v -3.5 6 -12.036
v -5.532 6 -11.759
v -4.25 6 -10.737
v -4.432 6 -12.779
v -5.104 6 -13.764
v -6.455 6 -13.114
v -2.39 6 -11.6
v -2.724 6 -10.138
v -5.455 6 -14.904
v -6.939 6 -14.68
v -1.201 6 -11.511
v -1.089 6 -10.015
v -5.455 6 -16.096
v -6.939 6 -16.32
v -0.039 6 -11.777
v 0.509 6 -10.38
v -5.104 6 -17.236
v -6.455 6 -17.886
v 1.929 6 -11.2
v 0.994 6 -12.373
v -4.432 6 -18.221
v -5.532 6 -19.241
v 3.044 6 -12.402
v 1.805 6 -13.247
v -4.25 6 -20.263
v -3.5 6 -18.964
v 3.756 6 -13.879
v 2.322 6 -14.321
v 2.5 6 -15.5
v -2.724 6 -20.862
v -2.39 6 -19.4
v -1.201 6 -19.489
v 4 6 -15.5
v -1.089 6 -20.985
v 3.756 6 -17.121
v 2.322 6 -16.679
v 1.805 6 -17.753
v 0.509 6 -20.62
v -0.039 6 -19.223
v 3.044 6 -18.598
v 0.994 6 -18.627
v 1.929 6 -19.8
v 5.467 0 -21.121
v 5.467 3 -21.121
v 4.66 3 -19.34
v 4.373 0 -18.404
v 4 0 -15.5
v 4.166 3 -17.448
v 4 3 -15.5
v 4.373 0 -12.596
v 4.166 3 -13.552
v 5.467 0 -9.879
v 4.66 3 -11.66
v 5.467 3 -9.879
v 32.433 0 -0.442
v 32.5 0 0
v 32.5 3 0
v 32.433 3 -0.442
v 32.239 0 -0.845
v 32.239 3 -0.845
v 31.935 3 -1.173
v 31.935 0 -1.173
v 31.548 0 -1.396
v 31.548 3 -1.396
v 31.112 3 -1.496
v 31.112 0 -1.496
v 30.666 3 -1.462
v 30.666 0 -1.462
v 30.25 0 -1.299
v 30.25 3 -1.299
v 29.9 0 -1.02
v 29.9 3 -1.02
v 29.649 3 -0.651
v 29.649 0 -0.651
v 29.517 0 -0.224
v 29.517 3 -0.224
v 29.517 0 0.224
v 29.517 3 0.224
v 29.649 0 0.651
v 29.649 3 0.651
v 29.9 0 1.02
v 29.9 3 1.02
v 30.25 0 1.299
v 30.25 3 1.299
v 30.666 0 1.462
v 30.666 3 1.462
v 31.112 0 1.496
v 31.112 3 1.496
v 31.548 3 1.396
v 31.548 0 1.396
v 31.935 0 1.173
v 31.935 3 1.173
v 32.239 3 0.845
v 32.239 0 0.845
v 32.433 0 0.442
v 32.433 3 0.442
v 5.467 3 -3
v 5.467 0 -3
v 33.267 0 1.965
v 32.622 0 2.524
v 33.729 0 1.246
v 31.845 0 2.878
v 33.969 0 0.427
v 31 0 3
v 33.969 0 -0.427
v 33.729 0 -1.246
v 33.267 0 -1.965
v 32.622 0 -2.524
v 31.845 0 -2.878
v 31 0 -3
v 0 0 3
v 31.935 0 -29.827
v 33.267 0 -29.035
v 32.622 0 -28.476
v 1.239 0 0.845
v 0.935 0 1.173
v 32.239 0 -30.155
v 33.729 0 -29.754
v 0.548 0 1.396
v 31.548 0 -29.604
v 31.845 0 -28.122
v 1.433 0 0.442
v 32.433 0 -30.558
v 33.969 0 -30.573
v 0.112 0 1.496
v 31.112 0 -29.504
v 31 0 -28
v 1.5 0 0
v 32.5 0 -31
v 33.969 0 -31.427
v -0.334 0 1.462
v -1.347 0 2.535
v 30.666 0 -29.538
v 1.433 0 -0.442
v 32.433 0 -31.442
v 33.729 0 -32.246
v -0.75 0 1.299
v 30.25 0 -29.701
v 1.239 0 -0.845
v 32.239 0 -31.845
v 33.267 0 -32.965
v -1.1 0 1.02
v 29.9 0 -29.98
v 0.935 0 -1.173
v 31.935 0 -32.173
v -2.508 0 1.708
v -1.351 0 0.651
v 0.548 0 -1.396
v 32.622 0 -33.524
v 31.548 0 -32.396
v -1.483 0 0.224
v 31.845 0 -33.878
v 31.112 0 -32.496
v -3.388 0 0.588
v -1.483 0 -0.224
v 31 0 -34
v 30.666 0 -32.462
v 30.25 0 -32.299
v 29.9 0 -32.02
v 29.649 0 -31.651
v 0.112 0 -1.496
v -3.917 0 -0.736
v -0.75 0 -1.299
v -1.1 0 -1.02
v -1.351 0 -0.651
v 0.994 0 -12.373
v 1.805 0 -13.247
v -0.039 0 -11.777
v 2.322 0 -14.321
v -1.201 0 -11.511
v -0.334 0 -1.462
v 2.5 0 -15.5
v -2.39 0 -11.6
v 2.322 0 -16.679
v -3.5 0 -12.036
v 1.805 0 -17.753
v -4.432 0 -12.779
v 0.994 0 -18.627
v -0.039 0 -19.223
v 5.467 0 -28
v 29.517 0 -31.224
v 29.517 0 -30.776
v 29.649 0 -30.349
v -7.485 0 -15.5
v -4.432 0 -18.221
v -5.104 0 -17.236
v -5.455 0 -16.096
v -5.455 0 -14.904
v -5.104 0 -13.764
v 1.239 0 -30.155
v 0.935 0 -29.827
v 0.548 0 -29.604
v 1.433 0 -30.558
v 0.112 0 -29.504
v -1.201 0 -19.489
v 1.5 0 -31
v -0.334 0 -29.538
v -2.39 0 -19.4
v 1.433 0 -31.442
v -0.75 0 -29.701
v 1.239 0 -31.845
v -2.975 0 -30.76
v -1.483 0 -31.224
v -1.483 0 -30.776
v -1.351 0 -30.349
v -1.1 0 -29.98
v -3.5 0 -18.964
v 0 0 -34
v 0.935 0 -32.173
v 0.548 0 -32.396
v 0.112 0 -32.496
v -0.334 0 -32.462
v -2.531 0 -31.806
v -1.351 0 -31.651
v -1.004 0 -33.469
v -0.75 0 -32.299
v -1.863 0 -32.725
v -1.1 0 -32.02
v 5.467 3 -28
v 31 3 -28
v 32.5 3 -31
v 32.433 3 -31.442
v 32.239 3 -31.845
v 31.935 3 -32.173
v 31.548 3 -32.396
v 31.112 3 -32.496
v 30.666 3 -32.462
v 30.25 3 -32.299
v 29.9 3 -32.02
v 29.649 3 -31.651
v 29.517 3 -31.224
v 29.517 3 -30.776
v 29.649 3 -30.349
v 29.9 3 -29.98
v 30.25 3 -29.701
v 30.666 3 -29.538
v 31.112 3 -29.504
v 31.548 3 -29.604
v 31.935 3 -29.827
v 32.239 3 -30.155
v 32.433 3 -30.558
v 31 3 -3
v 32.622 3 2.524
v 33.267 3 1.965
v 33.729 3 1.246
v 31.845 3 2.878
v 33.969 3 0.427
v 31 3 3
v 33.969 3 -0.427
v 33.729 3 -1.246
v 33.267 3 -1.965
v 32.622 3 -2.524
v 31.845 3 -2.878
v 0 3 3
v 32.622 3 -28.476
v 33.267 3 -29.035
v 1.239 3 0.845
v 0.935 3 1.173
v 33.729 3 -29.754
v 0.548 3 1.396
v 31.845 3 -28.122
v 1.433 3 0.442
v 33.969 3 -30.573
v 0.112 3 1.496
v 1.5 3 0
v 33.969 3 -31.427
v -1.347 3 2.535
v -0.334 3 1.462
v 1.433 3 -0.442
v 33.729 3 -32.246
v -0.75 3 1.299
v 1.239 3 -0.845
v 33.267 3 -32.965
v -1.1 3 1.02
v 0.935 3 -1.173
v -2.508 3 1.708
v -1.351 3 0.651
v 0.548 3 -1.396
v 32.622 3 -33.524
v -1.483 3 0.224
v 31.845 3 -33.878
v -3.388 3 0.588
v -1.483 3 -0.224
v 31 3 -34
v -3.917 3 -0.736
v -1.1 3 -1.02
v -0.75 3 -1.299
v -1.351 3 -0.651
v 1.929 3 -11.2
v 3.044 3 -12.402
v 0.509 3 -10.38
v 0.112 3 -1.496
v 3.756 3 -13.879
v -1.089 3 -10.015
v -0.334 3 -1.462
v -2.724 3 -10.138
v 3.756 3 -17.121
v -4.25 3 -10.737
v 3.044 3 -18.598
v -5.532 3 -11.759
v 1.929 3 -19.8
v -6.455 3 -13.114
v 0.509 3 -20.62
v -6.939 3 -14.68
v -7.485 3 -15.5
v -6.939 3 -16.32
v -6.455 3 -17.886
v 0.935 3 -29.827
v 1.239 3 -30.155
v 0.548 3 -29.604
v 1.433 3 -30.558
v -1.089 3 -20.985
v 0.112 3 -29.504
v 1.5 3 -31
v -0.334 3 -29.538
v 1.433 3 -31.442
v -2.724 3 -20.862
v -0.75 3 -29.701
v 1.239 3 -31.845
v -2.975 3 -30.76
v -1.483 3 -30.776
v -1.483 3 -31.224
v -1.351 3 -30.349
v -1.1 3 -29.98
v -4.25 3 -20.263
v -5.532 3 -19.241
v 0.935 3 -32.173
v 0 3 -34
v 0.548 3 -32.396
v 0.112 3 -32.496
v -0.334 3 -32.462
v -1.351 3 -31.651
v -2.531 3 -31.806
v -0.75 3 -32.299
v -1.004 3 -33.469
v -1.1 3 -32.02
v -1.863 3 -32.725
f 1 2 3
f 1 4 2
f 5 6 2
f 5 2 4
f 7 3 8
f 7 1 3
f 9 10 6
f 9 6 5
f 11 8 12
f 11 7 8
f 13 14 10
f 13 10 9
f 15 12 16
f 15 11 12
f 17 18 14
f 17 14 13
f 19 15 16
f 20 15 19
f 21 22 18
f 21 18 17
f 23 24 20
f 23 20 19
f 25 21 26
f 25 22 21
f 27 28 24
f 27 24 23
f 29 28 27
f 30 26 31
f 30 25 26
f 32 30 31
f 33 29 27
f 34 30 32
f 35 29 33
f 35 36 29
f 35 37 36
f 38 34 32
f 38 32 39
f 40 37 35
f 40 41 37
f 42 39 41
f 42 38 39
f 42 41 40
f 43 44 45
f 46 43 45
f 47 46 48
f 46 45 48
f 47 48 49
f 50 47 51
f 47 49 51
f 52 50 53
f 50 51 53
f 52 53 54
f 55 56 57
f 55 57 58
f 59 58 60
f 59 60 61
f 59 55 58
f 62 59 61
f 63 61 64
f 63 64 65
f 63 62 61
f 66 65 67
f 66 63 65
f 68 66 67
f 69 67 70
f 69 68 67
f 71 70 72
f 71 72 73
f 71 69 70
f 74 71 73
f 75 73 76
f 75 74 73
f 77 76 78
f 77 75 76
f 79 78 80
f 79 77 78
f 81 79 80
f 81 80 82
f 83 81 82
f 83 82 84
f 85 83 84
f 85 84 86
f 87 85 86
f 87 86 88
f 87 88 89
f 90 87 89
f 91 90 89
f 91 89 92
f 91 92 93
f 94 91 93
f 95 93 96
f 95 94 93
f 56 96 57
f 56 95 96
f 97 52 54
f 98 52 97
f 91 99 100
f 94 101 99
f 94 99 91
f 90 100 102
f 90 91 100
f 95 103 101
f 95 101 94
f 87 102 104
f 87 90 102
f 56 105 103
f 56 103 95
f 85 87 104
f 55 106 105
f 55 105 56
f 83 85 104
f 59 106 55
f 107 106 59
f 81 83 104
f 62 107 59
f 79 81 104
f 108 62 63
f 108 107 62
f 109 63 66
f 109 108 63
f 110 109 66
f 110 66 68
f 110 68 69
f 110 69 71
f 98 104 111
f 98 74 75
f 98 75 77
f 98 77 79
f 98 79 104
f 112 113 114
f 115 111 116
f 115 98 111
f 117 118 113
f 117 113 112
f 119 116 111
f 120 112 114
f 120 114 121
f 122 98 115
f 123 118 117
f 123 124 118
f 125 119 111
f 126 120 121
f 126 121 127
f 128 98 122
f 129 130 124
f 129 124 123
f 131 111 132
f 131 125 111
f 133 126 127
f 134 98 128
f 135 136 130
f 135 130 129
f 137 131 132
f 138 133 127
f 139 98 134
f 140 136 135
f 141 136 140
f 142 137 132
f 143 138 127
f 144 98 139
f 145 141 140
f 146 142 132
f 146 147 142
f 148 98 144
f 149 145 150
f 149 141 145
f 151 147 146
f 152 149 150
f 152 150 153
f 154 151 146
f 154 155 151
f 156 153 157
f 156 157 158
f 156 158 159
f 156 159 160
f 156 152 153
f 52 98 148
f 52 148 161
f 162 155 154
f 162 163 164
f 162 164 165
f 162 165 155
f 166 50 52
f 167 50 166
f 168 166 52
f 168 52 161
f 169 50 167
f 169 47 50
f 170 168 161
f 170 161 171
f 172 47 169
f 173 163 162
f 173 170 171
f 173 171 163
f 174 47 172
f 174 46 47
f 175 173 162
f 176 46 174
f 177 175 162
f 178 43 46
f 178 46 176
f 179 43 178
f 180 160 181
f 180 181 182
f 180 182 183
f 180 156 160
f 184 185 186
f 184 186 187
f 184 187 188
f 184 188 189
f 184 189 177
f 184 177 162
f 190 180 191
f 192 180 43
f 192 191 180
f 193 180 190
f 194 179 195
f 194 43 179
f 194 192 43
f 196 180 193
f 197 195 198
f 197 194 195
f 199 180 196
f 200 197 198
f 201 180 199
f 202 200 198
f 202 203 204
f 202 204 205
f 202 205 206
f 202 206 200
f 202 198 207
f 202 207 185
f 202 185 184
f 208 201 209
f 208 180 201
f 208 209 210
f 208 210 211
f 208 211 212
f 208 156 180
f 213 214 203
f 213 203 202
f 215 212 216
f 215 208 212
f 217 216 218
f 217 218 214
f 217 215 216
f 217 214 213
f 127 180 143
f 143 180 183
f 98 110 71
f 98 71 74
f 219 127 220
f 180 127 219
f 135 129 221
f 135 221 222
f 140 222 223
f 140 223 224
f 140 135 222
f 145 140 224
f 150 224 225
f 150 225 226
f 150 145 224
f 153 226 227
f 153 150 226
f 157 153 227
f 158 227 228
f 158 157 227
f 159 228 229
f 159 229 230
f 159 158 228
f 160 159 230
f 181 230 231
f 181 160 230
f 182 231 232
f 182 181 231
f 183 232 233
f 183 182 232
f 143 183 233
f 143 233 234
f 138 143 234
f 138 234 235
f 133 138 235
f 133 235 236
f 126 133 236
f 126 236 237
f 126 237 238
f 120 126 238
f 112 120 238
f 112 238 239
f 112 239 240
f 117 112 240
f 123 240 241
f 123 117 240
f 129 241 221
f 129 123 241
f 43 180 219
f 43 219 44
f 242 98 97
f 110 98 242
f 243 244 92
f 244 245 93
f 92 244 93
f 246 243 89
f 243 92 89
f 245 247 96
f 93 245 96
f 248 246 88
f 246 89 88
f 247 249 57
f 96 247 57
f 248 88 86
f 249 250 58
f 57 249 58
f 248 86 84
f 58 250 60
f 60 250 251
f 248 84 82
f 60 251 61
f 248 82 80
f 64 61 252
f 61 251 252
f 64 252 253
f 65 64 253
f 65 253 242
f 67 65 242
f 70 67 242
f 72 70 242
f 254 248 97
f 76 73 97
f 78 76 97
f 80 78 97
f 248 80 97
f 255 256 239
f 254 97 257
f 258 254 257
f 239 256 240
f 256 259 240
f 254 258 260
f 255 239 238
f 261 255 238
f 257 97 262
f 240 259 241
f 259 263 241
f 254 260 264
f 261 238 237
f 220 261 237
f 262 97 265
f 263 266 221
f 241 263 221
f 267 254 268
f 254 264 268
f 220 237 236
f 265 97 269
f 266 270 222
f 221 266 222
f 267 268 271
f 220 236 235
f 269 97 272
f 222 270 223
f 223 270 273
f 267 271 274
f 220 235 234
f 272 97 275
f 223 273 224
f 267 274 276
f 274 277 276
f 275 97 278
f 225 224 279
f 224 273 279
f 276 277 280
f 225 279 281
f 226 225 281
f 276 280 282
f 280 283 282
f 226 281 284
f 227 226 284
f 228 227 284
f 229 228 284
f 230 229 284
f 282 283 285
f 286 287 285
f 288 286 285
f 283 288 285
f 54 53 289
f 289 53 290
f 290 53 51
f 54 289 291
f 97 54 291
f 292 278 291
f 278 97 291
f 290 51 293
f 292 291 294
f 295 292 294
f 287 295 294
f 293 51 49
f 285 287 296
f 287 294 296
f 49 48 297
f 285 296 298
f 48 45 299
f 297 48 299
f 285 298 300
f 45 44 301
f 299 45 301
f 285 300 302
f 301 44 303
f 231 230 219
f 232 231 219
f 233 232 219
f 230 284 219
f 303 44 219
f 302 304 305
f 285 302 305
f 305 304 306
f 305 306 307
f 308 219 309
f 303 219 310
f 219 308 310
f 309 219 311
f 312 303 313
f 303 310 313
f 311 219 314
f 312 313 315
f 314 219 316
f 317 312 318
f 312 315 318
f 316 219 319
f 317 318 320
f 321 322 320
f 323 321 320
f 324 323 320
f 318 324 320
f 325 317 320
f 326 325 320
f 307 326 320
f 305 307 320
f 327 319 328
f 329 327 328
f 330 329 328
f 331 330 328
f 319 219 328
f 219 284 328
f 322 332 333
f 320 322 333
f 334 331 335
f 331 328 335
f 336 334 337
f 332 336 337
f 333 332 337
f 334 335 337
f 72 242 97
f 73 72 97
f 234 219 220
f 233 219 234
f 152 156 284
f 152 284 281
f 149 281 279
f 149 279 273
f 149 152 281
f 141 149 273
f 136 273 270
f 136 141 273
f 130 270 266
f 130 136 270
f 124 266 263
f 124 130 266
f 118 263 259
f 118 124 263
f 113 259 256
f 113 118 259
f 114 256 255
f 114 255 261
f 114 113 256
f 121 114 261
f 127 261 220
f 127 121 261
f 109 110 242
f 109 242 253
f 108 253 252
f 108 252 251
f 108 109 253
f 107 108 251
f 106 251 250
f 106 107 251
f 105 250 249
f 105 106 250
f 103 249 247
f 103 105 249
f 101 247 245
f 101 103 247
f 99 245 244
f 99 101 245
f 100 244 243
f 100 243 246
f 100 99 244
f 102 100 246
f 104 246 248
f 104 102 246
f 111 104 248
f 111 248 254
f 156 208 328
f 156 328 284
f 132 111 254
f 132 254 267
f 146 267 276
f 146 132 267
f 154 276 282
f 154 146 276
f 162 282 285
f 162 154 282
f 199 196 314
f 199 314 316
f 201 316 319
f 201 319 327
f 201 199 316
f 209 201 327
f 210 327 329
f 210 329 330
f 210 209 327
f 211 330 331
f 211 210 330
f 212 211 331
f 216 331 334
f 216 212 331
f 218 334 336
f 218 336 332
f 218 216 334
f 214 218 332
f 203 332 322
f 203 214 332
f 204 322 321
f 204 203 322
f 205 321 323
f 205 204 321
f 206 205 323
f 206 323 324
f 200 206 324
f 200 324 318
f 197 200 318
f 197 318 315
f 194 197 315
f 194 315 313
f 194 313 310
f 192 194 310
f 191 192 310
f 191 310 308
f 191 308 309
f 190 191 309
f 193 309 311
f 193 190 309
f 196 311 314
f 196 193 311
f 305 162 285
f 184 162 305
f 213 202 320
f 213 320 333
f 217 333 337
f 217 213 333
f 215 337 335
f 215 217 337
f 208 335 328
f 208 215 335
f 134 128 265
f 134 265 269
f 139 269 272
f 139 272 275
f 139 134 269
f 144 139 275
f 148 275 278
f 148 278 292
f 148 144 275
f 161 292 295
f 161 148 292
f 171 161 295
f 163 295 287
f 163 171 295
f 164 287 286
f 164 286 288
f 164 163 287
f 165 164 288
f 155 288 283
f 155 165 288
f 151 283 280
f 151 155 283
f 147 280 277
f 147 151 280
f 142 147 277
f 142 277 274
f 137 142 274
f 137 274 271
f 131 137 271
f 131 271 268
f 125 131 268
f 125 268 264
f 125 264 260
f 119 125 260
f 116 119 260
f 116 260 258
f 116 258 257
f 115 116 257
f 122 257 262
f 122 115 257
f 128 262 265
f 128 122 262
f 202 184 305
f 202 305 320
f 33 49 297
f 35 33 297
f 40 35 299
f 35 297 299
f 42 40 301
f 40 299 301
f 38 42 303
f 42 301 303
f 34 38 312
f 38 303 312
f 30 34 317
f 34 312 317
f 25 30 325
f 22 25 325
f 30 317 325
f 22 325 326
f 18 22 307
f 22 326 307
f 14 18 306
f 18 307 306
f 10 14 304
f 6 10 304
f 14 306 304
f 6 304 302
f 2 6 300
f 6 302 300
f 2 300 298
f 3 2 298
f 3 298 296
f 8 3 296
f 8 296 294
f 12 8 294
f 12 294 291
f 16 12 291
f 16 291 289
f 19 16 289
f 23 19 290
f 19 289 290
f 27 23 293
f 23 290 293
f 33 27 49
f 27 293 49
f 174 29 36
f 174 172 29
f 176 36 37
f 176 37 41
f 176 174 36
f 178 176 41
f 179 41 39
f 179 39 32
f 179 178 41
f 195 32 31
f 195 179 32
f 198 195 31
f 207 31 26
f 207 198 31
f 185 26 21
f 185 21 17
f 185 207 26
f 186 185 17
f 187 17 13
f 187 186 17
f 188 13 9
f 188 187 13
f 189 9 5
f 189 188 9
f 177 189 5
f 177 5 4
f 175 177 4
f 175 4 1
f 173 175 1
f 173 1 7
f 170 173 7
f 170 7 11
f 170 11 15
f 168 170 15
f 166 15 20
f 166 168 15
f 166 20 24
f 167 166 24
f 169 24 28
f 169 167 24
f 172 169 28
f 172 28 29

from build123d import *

# Parameters (mm, degrees)
SKETCH1_R           = 1.5
SKETCH1_R_2         = 4
BOSS_EXTRUDE1_DEPTH = 3
SKETCH2_R           = 11.5
CUT_EXTRUDE2_DEPTH  = 3
SKETCH3_R           = 5.5
SKETCH3_R_2         = 4
BOSS_EXTRUDE2_DEPTH = 3


with BuildPart() as part:
    # Sketch1 → Boss-Extrude1 (new body)
    with BuildSketch(Plane(origin=(0, 0, 0), x_dir=(1, 0, 0), z_dir=(0, 1, 0))):
        with BuildLine():
            Line((31, -3), (0, -3))
            ThreePointArc((0, -3), (-2.5078369, -1.708002816), (-3.917144015, 0.735837624))
            Line((-3.917144015, 0.735837624), (-7.484880003, 15.5))
            Line((-7.484880003, 15.5), (-2.974611695, 30.760315636))
            ThreePointArc((-2.974611695, 30.760315636), (-1.862648685, 32.724789909), (0, 34))
            Line((0, 34), (31, 34))
            ThreePointArc((31, 34), (34, 31), (31, 28))
            Line((31, 28), (5.467072376, 28))
            Line((5.467072376, 28), (5.467072376, 3))
            Line((5.467072376, 3), (31, 3))
            ThreePointArc((31, 3), (34, 0), (31, -3))
        make_face()
        with Locations((0, 31)):
            Circle(SKETCH1_R, mode=Mode.SUBTRACT)
        with Locations((31, 31)):
            Circle(SKETCH1_R, mode=Mode.SUBTRACT)
        with Locations((31, 0)):
            Circle(SKETCH1_R, mode=Mode.SUBTRACT)
        Circle(SKETCH1_R, mode=Mode.SUBTRACT)
        with Locations((-1.5, 15.5)):
            Circle(SKETCH1_R_2, mode=Mode.SUBTRACT)
    extrude(amount=BOSS_EXTRUDE1_DEPTH)

    # Sketch2 → Cut-Extrude2 (cut)
    with BuildSketch(Plane(origin=(0, 3, 0), x_dir=(1, 0, 0), z_dir=(0, 1, 0))):
        with Locations((15.5, 15.5)):
            Circle(SKETCH2_R)
    extrude(amount=-CUT_EXTRUDE2_DEPTH, mode=Mode.SUBTRACT)

    # Sketch3 → Boss-Extrude2 (add)
    with BuildSketch(Plane(origin=(0, 3, 0), x_dir=(1, 0, 0), z_dir=(0, 1, 0))):
        with Locations((-1.5, 15.5)):
            Circle(SKETCH3_R)
        with Locations((-1.5, 15.5)):
            Circle(SKETCH3_R_2, mode=Mode.SUBTRACT)
    extrude(amount=BOSS_EXTRUDE2_DEPTH)


solid = part.part
